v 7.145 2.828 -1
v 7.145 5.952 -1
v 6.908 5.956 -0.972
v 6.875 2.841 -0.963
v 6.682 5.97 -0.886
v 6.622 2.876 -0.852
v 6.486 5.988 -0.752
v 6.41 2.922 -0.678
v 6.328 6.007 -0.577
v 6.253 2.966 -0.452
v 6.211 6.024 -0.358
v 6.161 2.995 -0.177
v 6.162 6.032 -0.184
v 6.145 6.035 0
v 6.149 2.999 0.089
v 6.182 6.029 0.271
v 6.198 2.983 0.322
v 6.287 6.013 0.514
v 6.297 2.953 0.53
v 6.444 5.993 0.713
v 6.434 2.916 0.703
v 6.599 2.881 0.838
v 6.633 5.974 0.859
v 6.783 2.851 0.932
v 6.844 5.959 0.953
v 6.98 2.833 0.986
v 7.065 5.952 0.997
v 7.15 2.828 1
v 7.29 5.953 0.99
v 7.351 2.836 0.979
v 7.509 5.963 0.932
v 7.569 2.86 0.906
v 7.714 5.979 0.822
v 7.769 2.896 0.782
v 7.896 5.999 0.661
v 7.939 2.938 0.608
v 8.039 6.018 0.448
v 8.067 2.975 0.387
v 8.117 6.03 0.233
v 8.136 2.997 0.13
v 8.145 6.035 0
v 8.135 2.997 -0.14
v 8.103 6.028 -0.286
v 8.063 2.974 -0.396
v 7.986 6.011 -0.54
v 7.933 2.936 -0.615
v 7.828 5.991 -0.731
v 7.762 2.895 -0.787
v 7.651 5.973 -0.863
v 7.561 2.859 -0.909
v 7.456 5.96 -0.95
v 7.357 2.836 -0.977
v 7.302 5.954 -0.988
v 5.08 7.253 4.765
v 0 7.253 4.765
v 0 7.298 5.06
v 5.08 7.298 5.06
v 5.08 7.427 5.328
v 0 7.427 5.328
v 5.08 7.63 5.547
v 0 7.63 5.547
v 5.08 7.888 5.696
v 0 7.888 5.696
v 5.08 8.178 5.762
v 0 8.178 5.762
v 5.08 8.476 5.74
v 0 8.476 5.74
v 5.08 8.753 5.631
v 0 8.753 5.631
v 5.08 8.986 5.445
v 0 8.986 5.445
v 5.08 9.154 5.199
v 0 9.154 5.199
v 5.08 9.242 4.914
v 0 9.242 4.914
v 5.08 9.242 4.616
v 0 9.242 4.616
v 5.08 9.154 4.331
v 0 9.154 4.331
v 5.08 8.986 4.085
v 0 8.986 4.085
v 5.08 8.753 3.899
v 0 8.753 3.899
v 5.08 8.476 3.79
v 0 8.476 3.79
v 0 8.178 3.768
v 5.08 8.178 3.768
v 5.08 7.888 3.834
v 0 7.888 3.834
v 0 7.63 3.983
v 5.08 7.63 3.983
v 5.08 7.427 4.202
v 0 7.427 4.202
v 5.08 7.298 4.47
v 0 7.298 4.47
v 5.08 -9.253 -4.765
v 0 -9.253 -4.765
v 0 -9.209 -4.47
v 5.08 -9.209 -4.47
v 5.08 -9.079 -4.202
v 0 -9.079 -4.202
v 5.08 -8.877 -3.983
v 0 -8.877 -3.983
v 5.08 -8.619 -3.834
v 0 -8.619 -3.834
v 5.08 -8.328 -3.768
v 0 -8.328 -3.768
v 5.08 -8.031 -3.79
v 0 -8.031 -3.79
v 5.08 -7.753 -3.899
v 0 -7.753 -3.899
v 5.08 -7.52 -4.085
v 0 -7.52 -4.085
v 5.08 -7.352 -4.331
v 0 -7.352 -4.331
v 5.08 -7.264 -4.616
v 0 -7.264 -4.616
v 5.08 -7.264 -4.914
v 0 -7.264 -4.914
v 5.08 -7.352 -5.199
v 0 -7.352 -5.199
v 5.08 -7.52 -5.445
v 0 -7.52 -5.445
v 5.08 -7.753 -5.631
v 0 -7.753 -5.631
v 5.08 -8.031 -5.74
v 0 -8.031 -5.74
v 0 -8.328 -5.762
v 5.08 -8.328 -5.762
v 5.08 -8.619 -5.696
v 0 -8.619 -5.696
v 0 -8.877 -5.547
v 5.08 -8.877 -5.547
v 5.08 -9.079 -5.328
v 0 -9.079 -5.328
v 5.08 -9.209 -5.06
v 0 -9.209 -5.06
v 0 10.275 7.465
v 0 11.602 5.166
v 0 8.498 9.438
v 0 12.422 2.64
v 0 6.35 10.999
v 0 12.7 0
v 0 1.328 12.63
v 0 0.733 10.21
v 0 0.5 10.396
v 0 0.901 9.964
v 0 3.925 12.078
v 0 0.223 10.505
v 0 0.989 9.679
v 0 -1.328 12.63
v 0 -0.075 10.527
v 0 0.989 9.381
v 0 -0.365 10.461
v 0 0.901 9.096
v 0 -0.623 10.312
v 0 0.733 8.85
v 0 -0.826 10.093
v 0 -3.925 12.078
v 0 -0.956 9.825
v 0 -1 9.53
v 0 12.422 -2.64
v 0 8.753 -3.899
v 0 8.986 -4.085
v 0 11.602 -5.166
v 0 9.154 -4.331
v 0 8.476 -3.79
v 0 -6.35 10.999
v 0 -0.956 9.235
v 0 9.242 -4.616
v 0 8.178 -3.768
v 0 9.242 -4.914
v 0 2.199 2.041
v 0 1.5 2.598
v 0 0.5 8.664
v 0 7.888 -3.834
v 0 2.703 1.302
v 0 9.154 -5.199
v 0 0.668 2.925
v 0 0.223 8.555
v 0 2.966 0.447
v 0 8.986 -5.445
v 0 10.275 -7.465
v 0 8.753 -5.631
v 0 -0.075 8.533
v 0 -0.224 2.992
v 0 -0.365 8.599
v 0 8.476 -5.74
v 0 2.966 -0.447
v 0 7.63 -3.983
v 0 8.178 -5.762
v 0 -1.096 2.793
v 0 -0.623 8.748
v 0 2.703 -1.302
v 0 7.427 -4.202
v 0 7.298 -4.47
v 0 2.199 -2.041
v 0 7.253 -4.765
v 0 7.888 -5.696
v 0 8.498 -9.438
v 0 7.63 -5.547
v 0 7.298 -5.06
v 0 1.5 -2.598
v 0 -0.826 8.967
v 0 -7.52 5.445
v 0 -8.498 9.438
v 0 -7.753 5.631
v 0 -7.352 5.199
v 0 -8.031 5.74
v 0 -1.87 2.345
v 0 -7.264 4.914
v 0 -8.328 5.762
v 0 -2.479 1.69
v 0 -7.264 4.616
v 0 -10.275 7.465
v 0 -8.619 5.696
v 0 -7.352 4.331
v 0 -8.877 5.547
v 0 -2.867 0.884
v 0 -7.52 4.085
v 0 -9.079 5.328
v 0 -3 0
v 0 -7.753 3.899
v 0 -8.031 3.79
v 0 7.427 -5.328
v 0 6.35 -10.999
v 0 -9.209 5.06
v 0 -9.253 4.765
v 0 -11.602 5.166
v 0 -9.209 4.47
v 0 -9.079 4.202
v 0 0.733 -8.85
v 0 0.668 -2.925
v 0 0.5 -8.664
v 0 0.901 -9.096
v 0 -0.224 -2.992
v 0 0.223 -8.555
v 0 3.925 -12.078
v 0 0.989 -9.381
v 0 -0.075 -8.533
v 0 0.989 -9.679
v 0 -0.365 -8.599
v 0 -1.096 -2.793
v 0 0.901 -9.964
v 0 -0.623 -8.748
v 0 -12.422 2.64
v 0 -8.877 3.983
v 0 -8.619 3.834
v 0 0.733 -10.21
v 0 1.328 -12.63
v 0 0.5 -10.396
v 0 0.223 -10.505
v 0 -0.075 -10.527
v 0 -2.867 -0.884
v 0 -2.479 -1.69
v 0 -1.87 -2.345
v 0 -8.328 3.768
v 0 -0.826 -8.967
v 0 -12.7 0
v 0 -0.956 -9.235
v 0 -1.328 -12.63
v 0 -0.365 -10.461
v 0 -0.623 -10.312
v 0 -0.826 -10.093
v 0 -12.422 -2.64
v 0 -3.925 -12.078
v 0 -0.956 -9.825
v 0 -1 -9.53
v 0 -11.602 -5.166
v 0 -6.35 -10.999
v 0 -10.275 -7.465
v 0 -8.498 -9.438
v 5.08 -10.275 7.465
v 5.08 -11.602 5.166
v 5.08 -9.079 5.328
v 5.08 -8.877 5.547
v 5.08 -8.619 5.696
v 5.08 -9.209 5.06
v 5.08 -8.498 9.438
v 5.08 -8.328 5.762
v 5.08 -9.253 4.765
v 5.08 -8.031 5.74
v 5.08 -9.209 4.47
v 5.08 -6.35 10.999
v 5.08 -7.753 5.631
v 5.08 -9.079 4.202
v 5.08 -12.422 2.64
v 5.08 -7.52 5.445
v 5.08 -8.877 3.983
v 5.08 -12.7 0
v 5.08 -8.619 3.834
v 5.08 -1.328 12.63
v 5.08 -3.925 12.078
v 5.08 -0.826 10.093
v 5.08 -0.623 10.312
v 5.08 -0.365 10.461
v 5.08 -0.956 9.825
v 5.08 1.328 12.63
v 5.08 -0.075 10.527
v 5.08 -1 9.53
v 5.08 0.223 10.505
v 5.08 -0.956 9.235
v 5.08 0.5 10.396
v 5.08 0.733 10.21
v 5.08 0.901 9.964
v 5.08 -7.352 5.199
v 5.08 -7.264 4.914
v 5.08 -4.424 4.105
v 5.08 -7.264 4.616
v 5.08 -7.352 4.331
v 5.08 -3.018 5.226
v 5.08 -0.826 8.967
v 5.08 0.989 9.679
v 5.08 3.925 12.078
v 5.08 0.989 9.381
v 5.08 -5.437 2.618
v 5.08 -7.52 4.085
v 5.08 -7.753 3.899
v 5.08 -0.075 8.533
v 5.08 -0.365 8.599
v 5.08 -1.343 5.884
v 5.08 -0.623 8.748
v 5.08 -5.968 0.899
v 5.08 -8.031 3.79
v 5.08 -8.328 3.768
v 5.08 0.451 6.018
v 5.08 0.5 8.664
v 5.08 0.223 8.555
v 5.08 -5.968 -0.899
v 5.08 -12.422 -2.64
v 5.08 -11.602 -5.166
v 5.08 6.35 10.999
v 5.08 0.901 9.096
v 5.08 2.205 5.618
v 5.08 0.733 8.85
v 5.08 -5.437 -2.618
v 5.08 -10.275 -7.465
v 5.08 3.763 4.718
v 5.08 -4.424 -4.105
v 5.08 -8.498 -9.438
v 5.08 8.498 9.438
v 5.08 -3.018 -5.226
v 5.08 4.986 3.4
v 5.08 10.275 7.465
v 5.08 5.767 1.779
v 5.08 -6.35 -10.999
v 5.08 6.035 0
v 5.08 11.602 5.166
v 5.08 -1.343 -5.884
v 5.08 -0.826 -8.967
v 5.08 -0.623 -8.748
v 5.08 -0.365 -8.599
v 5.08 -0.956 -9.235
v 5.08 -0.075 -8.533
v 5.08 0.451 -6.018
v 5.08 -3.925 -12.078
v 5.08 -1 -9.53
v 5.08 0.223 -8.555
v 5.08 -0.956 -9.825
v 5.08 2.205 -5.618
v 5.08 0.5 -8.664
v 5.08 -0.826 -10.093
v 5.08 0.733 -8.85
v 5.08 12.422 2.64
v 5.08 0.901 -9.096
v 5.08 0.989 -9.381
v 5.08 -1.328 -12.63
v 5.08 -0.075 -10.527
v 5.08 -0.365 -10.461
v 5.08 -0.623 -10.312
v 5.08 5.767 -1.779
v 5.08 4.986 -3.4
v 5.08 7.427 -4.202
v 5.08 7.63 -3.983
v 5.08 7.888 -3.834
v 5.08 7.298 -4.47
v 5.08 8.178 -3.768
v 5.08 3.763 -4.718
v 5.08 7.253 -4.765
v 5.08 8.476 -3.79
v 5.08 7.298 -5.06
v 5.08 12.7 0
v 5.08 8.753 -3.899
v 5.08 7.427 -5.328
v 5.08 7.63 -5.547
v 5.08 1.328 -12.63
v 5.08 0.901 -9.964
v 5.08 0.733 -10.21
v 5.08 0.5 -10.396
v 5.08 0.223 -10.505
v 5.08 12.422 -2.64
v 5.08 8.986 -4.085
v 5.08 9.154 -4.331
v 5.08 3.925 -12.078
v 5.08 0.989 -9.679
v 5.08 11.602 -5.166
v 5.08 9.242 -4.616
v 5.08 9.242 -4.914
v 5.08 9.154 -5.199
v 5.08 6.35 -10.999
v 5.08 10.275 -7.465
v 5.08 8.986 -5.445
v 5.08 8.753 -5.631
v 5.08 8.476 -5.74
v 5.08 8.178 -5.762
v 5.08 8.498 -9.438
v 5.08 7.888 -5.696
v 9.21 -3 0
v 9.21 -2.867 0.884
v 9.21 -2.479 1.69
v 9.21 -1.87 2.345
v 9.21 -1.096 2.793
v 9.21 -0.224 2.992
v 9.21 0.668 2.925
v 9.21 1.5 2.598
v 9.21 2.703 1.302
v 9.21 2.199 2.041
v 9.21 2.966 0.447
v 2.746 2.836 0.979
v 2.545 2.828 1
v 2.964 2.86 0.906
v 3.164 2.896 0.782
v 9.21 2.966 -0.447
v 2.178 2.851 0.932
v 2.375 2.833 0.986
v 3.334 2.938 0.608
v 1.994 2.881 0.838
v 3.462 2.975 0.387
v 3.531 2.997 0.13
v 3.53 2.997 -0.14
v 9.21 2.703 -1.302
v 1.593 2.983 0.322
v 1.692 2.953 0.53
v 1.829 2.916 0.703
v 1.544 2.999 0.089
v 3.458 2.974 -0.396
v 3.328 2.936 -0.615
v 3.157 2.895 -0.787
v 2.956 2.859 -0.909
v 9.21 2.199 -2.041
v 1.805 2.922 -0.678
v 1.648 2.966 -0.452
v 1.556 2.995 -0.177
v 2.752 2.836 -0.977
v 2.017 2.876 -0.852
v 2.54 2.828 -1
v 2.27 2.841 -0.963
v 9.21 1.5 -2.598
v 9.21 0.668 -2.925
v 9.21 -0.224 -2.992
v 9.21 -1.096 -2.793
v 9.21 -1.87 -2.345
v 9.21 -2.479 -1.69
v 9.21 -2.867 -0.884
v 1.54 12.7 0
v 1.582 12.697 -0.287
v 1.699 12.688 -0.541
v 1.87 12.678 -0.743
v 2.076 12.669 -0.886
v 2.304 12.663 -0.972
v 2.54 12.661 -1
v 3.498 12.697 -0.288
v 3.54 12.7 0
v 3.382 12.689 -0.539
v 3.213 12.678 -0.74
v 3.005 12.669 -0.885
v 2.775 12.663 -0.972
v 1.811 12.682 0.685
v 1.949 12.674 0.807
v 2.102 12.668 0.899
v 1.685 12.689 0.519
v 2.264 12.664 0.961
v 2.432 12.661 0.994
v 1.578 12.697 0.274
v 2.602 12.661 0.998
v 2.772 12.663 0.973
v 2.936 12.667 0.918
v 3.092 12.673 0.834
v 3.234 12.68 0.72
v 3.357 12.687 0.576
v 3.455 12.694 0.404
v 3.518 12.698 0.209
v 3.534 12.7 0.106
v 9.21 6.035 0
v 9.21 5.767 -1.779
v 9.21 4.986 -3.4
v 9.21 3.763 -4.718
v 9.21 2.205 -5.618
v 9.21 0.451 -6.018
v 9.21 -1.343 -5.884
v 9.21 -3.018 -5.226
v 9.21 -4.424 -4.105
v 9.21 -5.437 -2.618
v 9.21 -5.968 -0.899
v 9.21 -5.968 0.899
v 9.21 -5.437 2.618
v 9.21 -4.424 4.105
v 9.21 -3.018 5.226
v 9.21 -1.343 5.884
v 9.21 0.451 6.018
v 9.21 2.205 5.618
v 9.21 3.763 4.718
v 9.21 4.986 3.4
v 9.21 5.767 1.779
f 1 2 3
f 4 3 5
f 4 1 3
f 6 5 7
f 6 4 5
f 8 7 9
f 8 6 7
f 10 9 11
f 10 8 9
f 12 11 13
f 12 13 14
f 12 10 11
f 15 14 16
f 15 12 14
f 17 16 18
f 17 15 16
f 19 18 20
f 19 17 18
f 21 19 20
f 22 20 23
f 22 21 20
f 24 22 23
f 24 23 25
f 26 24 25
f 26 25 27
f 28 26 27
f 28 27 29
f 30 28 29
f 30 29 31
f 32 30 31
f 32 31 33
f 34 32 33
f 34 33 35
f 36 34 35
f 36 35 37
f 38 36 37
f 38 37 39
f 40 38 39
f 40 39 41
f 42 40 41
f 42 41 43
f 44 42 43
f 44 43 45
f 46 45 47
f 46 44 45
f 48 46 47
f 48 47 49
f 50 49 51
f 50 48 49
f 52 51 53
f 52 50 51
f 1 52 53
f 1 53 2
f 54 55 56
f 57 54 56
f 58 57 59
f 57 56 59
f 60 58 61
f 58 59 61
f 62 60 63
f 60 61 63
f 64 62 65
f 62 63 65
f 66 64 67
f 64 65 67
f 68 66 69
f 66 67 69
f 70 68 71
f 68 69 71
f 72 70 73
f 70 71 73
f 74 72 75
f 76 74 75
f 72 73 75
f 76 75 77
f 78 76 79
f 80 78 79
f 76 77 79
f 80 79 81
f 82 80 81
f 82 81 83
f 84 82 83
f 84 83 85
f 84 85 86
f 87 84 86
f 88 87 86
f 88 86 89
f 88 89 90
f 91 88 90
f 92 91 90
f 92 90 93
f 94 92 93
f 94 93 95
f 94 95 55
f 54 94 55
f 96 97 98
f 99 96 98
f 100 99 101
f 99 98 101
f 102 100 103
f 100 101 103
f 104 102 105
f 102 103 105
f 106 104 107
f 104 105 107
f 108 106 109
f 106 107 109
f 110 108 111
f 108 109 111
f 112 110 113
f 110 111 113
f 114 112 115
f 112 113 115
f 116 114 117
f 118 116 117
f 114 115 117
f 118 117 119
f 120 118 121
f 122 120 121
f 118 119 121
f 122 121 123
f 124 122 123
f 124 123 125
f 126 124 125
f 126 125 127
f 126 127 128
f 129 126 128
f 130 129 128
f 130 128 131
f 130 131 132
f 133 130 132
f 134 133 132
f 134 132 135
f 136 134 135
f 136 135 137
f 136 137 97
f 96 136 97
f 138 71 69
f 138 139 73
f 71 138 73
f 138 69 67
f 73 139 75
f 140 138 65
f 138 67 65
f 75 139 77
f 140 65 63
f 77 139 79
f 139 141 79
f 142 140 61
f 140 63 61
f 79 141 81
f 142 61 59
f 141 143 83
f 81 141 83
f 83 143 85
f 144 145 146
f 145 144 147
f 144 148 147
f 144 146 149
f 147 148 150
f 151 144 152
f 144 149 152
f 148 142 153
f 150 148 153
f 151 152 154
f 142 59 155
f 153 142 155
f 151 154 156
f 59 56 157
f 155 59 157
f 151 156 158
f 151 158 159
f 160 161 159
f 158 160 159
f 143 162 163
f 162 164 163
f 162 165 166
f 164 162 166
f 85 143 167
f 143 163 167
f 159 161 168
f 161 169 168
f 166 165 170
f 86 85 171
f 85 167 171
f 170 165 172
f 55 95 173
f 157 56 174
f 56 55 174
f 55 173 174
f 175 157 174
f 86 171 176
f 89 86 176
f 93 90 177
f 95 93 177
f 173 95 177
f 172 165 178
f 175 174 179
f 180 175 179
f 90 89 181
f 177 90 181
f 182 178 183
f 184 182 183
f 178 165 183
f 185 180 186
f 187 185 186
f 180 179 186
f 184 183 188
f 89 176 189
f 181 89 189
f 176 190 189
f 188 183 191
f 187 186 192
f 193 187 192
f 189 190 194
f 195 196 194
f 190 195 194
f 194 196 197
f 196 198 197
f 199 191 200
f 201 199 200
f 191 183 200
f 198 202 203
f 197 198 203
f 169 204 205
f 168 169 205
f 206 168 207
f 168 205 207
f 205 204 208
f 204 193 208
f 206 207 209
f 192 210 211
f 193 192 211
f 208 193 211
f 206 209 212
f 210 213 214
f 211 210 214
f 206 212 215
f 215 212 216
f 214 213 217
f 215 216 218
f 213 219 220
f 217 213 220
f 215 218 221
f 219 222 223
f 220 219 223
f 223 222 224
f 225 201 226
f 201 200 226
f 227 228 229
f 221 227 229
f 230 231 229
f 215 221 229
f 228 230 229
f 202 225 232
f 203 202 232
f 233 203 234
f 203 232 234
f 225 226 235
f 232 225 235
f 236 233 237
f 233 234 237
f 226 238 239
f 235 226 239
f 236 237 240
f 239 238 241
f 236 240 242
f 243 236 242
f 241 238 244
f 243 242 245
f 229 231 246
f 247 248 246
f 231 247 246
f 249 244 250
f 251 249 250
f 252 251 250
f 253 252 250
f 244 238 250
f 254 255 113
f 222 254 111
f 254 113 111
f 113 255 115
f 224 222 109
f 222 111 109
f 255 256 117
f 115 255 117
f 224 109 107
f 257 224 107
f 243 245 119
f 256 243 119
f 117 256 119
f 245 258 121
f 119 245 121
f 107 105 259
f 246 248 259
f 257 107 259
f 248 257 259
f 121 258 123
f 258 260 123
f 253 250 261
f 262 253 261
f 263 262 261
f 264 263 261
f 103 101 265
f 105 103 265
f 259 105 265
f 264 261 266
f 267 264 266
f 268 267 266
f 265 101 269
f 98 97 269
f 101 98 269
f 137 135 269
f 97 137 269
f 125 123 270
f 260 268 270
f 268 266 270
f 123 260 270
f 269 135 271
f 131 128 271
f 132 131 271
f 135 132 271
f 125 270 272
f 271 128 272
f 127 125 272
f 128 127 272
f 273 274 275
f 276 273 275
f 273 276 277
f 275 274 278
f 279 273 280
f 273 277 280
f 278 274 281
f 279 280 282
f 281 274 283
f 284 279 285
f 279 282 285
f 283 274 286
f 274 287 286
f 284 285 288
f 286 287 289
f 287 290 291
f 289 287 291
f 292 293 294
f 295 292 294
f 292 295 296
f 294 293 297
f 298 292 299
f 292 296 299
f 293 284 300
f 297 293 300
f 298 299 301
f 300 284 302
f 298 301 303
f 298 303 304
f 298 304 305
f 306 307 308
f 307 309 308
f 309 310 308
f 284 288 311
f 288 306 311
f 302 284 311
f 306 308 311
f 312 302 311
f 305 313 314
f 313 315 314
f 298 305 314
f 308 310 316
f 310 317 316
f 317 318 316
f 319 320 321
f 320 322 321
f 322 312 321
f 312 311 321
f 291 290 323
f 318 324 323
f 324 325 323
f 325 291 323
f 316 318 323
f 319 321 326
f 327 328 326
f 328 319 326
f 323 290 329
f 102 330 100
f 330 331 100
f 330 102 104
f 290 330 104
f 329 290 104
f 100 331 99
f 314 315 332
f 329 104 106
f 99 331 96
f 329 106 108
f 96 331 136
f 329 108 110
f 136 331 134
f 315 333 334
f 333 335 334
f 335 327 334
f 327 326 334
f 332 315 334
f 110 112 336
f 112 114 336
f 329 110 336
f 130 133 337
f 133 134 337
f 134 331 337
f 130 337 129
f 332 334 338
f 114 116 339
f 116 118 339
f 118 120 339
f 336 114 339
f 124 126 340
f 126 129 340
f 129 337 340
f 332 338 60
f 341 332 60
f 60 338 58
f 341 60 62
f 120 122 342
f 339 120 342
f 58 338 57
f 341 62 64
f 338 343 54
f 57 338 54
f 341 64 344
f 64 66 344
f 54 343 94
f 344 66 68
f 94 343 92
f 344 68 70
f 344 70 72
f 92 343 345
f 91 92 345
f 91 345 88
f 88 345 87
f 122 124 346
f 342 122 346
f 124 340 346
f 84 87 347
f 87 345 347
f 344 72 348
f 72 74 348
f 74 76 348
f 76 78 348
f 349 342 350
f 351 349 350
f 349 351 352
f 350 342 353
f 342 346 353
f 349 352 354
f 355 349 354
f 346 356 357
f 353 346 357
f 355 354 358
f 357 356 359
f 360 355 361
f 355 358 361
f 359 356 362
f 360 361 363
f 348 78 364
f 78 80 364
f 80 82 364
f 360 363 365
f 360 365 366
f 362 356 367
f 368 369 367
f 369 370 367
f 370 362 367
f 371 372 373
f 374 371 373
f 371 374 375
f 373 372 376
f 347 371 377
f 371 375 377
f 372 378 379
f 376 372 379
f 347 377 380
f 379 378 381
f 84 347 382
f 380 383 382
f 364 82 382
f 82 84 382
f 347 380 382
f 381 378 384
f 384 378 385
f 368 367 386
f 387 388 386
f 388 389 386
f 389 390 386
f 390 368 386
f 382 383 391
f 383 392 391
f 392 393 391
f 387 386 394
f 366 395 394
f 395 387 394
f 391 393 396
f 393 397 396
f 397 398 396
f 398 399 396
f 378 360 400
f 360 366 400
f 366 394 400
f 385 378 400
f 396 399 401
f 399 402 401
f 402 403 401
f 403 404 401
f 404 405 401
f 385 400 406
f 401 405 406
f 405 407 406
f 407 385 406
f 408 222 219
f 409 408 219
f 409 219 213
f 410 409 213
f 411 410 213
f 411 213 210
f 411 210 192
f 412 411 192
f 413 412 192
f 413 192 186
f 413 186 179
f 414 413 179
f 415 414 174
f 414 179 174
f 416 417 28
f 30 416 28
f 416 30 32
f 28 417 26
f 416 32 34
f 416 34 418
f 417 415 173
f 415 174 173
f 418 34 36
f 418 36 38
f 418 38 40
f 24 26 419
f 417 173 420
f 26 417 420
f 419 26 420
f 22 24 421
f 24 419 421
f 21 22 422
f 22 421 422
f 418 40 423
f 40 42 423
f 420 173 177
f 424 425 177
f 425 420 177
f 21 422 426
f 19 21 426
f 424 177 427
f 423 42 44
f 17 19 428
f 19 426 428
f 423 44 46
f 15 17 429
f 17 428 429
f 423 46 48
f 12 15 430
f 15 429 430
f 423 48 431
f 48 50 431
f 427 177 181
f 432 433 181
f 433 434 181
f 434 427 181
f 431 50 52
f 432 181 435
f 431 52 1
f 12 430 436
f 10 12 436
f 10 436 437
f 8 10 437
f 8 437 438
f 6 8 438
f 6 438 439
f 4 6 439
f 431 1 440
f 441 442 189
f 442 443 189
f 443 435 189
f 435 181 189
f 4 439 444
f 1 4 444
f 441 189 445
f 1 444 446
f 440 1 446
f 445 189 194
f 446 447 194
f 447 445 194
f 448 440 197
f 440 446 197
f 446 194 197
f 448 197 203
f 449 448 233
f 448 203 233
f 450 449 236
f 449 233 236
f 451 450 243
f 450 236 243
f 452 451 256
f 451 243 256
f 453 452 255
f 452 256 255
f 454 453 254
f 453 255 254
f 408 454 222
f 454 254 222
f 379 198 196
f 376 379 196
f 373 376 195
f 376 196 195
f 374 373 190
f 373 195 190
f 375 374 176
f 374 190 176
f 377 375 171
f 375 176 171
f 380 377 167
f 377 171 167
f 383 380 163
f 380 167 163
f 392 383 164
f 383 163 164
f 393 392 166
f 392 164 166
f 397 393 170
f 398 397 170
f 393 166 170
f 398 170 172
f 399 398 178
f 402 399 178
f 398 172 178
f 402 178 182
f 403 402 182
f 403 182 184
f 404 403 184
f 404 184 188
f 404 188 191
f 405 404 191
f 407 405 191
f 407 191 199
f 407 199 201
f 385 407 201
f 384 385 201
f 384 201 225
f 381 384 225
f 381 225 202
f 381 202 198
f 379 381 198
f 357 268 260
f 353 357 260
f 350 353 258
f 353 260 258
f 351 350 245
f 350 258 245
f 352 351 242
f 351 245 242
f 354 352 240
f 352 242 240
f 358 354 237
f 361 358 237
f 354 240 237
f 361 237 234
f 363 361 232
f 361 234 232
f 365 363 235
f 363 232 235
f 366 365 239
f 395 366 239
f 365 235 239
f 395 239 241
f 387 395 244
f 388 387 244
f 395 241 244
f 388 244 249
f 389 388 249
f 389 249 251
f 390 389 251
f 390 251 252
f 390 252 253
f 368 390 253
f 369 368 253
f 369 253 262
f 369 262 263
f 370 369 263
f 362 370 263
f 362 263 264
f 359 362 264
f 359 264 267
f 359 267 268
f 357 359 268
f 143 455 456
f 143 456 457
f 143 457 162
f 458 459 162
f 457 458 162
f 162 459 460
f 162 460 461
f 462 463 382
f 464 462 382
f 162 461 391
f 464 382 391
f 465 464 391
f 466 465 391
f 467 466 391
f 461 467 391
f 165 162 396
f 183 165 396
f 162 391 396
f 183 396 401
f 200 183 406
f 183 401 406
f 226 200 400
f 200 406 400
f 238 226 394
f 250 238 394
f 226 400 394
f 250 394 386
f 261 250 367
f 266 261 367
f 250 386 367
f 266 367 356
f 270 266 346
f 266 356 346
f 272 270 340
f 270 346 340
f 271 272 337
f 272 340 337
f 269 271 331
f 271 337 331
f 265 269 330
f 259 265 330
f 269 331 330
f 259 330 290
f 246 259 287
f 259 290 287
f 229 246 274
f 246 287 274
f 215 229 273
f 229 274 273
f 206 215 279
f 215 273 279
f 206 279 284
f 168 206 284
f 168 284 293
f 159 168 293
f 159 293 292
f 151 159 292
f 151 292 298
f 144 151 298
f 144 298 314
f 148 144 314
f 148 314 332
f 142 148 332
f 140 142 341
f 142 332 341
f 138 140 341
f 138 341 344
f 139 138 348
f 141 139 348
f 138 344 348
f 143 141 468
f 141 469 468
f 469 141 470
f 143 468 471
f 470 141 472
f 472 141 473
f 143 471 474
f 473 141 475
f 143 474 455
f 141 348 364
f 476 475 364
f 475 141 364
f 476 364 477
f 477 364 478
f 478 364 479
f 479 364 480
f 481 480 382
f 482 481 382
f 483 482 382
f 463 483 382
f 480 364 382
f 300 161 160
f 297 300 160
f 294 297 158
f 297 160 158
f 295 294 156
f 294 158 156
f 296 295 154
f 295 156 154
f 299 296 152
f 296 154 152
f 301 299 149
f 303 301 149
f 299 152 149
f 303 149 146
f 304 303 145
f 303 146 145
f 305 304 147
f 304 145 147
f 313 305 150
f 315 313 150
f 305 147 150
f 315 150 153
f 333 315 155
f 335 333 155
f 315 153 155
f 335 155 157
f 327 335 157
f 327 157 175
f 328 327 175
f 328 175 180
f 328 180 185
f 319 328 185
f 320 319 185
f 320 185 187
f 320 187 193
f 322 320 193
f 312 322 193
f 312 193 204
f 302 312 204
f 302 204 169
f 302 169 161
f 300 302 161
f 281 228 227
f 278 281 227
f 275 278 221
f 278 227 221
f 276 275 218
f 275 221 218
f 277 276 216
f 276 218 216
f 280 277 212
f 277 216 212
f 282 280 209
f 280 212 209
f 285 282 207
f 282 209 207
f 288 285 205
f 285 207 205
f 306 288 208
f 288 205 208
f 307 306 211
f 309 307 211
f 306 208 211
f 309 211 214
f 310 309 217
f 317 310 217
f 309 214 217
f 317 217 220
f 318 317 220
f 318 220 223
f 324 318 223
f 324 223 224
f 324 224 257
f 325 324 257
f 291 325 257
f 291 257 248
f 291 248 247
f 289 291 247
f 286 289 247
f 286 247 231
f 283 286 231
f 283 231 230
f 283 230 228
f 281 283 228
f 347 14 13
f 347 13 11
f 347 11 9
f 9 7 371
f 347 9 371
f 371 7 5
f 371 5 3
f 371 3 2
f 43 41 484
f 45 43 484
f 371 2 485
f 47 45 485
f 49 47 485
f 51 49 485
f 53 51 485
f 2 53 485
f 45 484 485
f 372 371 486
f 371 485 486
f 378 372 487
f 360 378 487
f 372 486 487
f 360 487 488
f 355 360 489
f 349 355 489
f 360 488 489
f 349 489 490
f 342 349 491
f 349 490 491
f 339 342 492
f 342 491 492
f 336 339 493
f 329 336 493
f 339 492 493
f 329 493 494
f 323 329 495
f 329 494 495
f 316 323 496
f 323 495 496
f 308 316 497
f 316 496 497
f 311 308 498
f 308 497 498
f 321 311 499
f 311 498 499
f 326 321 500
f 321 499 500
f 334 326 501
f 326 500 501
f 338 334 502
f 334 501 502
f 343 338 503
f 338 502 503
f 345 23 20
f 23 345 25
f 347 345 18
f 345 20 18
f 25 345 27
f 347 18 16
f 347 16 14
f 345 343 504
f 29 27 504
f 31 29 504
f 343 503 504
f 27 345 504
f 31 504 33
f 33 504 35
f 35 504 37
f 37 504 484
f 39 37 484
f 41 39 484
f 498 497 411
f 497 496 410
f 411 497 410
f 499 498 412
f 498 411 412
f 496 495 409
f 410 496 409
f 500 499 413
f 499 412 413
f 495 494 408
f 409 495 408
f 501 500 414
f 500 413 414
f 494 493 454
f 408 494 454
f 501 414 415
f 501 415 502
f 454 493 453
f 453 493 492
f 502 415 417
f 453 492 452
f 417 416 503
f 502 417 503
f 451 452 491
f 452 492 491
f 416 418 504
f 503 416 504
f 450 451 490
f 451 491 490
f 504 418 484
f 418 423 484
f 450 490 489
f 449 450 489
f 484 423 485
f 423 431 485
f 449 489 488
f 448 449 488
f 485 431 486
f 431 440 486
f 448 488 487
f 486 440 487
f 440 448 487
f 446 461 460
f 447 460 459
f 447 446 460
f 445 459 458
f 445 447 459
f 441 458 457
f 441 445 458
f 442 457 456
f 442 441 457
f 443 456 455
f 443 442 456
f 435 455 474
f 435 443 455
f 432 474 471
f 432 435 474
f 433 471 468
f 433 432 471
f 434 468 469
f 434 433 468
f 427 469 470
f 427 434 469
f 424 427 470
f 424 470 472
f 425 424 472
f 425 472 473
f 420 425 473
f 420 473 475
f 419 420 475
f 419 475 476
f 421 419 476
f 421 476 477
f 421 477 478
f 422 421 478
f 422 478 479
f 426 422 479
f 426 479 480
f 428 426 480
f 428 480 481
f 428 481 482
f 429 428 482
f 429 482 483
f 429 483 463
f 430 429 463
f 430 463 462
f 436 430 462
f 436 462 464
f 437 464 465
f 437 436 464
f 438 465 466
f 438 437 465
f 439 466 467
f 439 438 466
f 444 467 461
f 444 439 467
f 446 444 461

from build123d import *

# Parameters (mm, degrees)
ESQUISSE2_R             = 1
ESQUISSE2_R_2           = 3
ENL_V_MAT_EXTRU_1_DEPTH = 21.184253764
ESQUISSE4_R             = 1
ENL_V_MAT_EXTRU_2_DEPTH = 21.184253764


with BuildPart() as part:
    # Esquisse1 → Révolution1 (revolve)
    with BuildSketch(Plane.XY):
        Polygon((0, 0), (0, 12.7), (5.08, 12.7), (5.08, 6.035), (9.21, 6.035), (9.21, 0), align=None)
    revolve(axis=Axis((9.21, 0, 0), (-1, 0, 0)))

    # Esquisse2 → Enlèv. mat.-Extru.1 (cut, through all)
    with BuildSketch(Plane.ZY):
        with Locations(Location((9.53, 0, 0), (0, 0, 270))):
            Circle(ESQUISSE2_R)
        with Locations(Location((4.765, -8.253222098, 0), (0, 0, 270))):
            Circle(ESQUISSE2_R)
        with Locations(Location((-4.765, -8.253222098, 0), (0, 0, 270))):
            Circle(ESQUISSE2_R)
        with Locations(Location((-9.53, 0, 0), (0, 0, 270))):
            Circle(ESQUISSE2_R)
        with Locations(Location((-4.765, 8.253222098, 0), (0, 0, 270))):
            Circle(ESQUISSE2_R)
        with Locations(Location((4.765, 8.253222098, 0), (0, 0, 270))):
            Circle(ESQUISSE2_R)
        with Locations(Location((0, 0, 0), (0, 0, 270))):
            Circle(ESQUISSE2_R_2)
    extrude(amount=-ENL_V_MAT_EXTRU_1_DEPTH, mode=Mode.SUBTRACT)

    # Esquisse4 → Enlèv. mat.-Extru.2 (cut, through all)
    with BuildSketch(Plane(origin=(0, 0, 0), x_dir=(1, 0, 0), z_dir=(0, 1, 0))):
        with Locations(Location((2.54, 0, 0), (0, 0, 90))):
            Circle(ESQUISSE4_R)
        with Locations(Location((7.145, 0, 0), (0, 0, 90))):
            Circle(ESQUISSE4_R)
    extrude(amount=ENL_V_MAT_EXTRU_2_DEPTH, mode=Mode.SUBTRACT)


solid = part.part
